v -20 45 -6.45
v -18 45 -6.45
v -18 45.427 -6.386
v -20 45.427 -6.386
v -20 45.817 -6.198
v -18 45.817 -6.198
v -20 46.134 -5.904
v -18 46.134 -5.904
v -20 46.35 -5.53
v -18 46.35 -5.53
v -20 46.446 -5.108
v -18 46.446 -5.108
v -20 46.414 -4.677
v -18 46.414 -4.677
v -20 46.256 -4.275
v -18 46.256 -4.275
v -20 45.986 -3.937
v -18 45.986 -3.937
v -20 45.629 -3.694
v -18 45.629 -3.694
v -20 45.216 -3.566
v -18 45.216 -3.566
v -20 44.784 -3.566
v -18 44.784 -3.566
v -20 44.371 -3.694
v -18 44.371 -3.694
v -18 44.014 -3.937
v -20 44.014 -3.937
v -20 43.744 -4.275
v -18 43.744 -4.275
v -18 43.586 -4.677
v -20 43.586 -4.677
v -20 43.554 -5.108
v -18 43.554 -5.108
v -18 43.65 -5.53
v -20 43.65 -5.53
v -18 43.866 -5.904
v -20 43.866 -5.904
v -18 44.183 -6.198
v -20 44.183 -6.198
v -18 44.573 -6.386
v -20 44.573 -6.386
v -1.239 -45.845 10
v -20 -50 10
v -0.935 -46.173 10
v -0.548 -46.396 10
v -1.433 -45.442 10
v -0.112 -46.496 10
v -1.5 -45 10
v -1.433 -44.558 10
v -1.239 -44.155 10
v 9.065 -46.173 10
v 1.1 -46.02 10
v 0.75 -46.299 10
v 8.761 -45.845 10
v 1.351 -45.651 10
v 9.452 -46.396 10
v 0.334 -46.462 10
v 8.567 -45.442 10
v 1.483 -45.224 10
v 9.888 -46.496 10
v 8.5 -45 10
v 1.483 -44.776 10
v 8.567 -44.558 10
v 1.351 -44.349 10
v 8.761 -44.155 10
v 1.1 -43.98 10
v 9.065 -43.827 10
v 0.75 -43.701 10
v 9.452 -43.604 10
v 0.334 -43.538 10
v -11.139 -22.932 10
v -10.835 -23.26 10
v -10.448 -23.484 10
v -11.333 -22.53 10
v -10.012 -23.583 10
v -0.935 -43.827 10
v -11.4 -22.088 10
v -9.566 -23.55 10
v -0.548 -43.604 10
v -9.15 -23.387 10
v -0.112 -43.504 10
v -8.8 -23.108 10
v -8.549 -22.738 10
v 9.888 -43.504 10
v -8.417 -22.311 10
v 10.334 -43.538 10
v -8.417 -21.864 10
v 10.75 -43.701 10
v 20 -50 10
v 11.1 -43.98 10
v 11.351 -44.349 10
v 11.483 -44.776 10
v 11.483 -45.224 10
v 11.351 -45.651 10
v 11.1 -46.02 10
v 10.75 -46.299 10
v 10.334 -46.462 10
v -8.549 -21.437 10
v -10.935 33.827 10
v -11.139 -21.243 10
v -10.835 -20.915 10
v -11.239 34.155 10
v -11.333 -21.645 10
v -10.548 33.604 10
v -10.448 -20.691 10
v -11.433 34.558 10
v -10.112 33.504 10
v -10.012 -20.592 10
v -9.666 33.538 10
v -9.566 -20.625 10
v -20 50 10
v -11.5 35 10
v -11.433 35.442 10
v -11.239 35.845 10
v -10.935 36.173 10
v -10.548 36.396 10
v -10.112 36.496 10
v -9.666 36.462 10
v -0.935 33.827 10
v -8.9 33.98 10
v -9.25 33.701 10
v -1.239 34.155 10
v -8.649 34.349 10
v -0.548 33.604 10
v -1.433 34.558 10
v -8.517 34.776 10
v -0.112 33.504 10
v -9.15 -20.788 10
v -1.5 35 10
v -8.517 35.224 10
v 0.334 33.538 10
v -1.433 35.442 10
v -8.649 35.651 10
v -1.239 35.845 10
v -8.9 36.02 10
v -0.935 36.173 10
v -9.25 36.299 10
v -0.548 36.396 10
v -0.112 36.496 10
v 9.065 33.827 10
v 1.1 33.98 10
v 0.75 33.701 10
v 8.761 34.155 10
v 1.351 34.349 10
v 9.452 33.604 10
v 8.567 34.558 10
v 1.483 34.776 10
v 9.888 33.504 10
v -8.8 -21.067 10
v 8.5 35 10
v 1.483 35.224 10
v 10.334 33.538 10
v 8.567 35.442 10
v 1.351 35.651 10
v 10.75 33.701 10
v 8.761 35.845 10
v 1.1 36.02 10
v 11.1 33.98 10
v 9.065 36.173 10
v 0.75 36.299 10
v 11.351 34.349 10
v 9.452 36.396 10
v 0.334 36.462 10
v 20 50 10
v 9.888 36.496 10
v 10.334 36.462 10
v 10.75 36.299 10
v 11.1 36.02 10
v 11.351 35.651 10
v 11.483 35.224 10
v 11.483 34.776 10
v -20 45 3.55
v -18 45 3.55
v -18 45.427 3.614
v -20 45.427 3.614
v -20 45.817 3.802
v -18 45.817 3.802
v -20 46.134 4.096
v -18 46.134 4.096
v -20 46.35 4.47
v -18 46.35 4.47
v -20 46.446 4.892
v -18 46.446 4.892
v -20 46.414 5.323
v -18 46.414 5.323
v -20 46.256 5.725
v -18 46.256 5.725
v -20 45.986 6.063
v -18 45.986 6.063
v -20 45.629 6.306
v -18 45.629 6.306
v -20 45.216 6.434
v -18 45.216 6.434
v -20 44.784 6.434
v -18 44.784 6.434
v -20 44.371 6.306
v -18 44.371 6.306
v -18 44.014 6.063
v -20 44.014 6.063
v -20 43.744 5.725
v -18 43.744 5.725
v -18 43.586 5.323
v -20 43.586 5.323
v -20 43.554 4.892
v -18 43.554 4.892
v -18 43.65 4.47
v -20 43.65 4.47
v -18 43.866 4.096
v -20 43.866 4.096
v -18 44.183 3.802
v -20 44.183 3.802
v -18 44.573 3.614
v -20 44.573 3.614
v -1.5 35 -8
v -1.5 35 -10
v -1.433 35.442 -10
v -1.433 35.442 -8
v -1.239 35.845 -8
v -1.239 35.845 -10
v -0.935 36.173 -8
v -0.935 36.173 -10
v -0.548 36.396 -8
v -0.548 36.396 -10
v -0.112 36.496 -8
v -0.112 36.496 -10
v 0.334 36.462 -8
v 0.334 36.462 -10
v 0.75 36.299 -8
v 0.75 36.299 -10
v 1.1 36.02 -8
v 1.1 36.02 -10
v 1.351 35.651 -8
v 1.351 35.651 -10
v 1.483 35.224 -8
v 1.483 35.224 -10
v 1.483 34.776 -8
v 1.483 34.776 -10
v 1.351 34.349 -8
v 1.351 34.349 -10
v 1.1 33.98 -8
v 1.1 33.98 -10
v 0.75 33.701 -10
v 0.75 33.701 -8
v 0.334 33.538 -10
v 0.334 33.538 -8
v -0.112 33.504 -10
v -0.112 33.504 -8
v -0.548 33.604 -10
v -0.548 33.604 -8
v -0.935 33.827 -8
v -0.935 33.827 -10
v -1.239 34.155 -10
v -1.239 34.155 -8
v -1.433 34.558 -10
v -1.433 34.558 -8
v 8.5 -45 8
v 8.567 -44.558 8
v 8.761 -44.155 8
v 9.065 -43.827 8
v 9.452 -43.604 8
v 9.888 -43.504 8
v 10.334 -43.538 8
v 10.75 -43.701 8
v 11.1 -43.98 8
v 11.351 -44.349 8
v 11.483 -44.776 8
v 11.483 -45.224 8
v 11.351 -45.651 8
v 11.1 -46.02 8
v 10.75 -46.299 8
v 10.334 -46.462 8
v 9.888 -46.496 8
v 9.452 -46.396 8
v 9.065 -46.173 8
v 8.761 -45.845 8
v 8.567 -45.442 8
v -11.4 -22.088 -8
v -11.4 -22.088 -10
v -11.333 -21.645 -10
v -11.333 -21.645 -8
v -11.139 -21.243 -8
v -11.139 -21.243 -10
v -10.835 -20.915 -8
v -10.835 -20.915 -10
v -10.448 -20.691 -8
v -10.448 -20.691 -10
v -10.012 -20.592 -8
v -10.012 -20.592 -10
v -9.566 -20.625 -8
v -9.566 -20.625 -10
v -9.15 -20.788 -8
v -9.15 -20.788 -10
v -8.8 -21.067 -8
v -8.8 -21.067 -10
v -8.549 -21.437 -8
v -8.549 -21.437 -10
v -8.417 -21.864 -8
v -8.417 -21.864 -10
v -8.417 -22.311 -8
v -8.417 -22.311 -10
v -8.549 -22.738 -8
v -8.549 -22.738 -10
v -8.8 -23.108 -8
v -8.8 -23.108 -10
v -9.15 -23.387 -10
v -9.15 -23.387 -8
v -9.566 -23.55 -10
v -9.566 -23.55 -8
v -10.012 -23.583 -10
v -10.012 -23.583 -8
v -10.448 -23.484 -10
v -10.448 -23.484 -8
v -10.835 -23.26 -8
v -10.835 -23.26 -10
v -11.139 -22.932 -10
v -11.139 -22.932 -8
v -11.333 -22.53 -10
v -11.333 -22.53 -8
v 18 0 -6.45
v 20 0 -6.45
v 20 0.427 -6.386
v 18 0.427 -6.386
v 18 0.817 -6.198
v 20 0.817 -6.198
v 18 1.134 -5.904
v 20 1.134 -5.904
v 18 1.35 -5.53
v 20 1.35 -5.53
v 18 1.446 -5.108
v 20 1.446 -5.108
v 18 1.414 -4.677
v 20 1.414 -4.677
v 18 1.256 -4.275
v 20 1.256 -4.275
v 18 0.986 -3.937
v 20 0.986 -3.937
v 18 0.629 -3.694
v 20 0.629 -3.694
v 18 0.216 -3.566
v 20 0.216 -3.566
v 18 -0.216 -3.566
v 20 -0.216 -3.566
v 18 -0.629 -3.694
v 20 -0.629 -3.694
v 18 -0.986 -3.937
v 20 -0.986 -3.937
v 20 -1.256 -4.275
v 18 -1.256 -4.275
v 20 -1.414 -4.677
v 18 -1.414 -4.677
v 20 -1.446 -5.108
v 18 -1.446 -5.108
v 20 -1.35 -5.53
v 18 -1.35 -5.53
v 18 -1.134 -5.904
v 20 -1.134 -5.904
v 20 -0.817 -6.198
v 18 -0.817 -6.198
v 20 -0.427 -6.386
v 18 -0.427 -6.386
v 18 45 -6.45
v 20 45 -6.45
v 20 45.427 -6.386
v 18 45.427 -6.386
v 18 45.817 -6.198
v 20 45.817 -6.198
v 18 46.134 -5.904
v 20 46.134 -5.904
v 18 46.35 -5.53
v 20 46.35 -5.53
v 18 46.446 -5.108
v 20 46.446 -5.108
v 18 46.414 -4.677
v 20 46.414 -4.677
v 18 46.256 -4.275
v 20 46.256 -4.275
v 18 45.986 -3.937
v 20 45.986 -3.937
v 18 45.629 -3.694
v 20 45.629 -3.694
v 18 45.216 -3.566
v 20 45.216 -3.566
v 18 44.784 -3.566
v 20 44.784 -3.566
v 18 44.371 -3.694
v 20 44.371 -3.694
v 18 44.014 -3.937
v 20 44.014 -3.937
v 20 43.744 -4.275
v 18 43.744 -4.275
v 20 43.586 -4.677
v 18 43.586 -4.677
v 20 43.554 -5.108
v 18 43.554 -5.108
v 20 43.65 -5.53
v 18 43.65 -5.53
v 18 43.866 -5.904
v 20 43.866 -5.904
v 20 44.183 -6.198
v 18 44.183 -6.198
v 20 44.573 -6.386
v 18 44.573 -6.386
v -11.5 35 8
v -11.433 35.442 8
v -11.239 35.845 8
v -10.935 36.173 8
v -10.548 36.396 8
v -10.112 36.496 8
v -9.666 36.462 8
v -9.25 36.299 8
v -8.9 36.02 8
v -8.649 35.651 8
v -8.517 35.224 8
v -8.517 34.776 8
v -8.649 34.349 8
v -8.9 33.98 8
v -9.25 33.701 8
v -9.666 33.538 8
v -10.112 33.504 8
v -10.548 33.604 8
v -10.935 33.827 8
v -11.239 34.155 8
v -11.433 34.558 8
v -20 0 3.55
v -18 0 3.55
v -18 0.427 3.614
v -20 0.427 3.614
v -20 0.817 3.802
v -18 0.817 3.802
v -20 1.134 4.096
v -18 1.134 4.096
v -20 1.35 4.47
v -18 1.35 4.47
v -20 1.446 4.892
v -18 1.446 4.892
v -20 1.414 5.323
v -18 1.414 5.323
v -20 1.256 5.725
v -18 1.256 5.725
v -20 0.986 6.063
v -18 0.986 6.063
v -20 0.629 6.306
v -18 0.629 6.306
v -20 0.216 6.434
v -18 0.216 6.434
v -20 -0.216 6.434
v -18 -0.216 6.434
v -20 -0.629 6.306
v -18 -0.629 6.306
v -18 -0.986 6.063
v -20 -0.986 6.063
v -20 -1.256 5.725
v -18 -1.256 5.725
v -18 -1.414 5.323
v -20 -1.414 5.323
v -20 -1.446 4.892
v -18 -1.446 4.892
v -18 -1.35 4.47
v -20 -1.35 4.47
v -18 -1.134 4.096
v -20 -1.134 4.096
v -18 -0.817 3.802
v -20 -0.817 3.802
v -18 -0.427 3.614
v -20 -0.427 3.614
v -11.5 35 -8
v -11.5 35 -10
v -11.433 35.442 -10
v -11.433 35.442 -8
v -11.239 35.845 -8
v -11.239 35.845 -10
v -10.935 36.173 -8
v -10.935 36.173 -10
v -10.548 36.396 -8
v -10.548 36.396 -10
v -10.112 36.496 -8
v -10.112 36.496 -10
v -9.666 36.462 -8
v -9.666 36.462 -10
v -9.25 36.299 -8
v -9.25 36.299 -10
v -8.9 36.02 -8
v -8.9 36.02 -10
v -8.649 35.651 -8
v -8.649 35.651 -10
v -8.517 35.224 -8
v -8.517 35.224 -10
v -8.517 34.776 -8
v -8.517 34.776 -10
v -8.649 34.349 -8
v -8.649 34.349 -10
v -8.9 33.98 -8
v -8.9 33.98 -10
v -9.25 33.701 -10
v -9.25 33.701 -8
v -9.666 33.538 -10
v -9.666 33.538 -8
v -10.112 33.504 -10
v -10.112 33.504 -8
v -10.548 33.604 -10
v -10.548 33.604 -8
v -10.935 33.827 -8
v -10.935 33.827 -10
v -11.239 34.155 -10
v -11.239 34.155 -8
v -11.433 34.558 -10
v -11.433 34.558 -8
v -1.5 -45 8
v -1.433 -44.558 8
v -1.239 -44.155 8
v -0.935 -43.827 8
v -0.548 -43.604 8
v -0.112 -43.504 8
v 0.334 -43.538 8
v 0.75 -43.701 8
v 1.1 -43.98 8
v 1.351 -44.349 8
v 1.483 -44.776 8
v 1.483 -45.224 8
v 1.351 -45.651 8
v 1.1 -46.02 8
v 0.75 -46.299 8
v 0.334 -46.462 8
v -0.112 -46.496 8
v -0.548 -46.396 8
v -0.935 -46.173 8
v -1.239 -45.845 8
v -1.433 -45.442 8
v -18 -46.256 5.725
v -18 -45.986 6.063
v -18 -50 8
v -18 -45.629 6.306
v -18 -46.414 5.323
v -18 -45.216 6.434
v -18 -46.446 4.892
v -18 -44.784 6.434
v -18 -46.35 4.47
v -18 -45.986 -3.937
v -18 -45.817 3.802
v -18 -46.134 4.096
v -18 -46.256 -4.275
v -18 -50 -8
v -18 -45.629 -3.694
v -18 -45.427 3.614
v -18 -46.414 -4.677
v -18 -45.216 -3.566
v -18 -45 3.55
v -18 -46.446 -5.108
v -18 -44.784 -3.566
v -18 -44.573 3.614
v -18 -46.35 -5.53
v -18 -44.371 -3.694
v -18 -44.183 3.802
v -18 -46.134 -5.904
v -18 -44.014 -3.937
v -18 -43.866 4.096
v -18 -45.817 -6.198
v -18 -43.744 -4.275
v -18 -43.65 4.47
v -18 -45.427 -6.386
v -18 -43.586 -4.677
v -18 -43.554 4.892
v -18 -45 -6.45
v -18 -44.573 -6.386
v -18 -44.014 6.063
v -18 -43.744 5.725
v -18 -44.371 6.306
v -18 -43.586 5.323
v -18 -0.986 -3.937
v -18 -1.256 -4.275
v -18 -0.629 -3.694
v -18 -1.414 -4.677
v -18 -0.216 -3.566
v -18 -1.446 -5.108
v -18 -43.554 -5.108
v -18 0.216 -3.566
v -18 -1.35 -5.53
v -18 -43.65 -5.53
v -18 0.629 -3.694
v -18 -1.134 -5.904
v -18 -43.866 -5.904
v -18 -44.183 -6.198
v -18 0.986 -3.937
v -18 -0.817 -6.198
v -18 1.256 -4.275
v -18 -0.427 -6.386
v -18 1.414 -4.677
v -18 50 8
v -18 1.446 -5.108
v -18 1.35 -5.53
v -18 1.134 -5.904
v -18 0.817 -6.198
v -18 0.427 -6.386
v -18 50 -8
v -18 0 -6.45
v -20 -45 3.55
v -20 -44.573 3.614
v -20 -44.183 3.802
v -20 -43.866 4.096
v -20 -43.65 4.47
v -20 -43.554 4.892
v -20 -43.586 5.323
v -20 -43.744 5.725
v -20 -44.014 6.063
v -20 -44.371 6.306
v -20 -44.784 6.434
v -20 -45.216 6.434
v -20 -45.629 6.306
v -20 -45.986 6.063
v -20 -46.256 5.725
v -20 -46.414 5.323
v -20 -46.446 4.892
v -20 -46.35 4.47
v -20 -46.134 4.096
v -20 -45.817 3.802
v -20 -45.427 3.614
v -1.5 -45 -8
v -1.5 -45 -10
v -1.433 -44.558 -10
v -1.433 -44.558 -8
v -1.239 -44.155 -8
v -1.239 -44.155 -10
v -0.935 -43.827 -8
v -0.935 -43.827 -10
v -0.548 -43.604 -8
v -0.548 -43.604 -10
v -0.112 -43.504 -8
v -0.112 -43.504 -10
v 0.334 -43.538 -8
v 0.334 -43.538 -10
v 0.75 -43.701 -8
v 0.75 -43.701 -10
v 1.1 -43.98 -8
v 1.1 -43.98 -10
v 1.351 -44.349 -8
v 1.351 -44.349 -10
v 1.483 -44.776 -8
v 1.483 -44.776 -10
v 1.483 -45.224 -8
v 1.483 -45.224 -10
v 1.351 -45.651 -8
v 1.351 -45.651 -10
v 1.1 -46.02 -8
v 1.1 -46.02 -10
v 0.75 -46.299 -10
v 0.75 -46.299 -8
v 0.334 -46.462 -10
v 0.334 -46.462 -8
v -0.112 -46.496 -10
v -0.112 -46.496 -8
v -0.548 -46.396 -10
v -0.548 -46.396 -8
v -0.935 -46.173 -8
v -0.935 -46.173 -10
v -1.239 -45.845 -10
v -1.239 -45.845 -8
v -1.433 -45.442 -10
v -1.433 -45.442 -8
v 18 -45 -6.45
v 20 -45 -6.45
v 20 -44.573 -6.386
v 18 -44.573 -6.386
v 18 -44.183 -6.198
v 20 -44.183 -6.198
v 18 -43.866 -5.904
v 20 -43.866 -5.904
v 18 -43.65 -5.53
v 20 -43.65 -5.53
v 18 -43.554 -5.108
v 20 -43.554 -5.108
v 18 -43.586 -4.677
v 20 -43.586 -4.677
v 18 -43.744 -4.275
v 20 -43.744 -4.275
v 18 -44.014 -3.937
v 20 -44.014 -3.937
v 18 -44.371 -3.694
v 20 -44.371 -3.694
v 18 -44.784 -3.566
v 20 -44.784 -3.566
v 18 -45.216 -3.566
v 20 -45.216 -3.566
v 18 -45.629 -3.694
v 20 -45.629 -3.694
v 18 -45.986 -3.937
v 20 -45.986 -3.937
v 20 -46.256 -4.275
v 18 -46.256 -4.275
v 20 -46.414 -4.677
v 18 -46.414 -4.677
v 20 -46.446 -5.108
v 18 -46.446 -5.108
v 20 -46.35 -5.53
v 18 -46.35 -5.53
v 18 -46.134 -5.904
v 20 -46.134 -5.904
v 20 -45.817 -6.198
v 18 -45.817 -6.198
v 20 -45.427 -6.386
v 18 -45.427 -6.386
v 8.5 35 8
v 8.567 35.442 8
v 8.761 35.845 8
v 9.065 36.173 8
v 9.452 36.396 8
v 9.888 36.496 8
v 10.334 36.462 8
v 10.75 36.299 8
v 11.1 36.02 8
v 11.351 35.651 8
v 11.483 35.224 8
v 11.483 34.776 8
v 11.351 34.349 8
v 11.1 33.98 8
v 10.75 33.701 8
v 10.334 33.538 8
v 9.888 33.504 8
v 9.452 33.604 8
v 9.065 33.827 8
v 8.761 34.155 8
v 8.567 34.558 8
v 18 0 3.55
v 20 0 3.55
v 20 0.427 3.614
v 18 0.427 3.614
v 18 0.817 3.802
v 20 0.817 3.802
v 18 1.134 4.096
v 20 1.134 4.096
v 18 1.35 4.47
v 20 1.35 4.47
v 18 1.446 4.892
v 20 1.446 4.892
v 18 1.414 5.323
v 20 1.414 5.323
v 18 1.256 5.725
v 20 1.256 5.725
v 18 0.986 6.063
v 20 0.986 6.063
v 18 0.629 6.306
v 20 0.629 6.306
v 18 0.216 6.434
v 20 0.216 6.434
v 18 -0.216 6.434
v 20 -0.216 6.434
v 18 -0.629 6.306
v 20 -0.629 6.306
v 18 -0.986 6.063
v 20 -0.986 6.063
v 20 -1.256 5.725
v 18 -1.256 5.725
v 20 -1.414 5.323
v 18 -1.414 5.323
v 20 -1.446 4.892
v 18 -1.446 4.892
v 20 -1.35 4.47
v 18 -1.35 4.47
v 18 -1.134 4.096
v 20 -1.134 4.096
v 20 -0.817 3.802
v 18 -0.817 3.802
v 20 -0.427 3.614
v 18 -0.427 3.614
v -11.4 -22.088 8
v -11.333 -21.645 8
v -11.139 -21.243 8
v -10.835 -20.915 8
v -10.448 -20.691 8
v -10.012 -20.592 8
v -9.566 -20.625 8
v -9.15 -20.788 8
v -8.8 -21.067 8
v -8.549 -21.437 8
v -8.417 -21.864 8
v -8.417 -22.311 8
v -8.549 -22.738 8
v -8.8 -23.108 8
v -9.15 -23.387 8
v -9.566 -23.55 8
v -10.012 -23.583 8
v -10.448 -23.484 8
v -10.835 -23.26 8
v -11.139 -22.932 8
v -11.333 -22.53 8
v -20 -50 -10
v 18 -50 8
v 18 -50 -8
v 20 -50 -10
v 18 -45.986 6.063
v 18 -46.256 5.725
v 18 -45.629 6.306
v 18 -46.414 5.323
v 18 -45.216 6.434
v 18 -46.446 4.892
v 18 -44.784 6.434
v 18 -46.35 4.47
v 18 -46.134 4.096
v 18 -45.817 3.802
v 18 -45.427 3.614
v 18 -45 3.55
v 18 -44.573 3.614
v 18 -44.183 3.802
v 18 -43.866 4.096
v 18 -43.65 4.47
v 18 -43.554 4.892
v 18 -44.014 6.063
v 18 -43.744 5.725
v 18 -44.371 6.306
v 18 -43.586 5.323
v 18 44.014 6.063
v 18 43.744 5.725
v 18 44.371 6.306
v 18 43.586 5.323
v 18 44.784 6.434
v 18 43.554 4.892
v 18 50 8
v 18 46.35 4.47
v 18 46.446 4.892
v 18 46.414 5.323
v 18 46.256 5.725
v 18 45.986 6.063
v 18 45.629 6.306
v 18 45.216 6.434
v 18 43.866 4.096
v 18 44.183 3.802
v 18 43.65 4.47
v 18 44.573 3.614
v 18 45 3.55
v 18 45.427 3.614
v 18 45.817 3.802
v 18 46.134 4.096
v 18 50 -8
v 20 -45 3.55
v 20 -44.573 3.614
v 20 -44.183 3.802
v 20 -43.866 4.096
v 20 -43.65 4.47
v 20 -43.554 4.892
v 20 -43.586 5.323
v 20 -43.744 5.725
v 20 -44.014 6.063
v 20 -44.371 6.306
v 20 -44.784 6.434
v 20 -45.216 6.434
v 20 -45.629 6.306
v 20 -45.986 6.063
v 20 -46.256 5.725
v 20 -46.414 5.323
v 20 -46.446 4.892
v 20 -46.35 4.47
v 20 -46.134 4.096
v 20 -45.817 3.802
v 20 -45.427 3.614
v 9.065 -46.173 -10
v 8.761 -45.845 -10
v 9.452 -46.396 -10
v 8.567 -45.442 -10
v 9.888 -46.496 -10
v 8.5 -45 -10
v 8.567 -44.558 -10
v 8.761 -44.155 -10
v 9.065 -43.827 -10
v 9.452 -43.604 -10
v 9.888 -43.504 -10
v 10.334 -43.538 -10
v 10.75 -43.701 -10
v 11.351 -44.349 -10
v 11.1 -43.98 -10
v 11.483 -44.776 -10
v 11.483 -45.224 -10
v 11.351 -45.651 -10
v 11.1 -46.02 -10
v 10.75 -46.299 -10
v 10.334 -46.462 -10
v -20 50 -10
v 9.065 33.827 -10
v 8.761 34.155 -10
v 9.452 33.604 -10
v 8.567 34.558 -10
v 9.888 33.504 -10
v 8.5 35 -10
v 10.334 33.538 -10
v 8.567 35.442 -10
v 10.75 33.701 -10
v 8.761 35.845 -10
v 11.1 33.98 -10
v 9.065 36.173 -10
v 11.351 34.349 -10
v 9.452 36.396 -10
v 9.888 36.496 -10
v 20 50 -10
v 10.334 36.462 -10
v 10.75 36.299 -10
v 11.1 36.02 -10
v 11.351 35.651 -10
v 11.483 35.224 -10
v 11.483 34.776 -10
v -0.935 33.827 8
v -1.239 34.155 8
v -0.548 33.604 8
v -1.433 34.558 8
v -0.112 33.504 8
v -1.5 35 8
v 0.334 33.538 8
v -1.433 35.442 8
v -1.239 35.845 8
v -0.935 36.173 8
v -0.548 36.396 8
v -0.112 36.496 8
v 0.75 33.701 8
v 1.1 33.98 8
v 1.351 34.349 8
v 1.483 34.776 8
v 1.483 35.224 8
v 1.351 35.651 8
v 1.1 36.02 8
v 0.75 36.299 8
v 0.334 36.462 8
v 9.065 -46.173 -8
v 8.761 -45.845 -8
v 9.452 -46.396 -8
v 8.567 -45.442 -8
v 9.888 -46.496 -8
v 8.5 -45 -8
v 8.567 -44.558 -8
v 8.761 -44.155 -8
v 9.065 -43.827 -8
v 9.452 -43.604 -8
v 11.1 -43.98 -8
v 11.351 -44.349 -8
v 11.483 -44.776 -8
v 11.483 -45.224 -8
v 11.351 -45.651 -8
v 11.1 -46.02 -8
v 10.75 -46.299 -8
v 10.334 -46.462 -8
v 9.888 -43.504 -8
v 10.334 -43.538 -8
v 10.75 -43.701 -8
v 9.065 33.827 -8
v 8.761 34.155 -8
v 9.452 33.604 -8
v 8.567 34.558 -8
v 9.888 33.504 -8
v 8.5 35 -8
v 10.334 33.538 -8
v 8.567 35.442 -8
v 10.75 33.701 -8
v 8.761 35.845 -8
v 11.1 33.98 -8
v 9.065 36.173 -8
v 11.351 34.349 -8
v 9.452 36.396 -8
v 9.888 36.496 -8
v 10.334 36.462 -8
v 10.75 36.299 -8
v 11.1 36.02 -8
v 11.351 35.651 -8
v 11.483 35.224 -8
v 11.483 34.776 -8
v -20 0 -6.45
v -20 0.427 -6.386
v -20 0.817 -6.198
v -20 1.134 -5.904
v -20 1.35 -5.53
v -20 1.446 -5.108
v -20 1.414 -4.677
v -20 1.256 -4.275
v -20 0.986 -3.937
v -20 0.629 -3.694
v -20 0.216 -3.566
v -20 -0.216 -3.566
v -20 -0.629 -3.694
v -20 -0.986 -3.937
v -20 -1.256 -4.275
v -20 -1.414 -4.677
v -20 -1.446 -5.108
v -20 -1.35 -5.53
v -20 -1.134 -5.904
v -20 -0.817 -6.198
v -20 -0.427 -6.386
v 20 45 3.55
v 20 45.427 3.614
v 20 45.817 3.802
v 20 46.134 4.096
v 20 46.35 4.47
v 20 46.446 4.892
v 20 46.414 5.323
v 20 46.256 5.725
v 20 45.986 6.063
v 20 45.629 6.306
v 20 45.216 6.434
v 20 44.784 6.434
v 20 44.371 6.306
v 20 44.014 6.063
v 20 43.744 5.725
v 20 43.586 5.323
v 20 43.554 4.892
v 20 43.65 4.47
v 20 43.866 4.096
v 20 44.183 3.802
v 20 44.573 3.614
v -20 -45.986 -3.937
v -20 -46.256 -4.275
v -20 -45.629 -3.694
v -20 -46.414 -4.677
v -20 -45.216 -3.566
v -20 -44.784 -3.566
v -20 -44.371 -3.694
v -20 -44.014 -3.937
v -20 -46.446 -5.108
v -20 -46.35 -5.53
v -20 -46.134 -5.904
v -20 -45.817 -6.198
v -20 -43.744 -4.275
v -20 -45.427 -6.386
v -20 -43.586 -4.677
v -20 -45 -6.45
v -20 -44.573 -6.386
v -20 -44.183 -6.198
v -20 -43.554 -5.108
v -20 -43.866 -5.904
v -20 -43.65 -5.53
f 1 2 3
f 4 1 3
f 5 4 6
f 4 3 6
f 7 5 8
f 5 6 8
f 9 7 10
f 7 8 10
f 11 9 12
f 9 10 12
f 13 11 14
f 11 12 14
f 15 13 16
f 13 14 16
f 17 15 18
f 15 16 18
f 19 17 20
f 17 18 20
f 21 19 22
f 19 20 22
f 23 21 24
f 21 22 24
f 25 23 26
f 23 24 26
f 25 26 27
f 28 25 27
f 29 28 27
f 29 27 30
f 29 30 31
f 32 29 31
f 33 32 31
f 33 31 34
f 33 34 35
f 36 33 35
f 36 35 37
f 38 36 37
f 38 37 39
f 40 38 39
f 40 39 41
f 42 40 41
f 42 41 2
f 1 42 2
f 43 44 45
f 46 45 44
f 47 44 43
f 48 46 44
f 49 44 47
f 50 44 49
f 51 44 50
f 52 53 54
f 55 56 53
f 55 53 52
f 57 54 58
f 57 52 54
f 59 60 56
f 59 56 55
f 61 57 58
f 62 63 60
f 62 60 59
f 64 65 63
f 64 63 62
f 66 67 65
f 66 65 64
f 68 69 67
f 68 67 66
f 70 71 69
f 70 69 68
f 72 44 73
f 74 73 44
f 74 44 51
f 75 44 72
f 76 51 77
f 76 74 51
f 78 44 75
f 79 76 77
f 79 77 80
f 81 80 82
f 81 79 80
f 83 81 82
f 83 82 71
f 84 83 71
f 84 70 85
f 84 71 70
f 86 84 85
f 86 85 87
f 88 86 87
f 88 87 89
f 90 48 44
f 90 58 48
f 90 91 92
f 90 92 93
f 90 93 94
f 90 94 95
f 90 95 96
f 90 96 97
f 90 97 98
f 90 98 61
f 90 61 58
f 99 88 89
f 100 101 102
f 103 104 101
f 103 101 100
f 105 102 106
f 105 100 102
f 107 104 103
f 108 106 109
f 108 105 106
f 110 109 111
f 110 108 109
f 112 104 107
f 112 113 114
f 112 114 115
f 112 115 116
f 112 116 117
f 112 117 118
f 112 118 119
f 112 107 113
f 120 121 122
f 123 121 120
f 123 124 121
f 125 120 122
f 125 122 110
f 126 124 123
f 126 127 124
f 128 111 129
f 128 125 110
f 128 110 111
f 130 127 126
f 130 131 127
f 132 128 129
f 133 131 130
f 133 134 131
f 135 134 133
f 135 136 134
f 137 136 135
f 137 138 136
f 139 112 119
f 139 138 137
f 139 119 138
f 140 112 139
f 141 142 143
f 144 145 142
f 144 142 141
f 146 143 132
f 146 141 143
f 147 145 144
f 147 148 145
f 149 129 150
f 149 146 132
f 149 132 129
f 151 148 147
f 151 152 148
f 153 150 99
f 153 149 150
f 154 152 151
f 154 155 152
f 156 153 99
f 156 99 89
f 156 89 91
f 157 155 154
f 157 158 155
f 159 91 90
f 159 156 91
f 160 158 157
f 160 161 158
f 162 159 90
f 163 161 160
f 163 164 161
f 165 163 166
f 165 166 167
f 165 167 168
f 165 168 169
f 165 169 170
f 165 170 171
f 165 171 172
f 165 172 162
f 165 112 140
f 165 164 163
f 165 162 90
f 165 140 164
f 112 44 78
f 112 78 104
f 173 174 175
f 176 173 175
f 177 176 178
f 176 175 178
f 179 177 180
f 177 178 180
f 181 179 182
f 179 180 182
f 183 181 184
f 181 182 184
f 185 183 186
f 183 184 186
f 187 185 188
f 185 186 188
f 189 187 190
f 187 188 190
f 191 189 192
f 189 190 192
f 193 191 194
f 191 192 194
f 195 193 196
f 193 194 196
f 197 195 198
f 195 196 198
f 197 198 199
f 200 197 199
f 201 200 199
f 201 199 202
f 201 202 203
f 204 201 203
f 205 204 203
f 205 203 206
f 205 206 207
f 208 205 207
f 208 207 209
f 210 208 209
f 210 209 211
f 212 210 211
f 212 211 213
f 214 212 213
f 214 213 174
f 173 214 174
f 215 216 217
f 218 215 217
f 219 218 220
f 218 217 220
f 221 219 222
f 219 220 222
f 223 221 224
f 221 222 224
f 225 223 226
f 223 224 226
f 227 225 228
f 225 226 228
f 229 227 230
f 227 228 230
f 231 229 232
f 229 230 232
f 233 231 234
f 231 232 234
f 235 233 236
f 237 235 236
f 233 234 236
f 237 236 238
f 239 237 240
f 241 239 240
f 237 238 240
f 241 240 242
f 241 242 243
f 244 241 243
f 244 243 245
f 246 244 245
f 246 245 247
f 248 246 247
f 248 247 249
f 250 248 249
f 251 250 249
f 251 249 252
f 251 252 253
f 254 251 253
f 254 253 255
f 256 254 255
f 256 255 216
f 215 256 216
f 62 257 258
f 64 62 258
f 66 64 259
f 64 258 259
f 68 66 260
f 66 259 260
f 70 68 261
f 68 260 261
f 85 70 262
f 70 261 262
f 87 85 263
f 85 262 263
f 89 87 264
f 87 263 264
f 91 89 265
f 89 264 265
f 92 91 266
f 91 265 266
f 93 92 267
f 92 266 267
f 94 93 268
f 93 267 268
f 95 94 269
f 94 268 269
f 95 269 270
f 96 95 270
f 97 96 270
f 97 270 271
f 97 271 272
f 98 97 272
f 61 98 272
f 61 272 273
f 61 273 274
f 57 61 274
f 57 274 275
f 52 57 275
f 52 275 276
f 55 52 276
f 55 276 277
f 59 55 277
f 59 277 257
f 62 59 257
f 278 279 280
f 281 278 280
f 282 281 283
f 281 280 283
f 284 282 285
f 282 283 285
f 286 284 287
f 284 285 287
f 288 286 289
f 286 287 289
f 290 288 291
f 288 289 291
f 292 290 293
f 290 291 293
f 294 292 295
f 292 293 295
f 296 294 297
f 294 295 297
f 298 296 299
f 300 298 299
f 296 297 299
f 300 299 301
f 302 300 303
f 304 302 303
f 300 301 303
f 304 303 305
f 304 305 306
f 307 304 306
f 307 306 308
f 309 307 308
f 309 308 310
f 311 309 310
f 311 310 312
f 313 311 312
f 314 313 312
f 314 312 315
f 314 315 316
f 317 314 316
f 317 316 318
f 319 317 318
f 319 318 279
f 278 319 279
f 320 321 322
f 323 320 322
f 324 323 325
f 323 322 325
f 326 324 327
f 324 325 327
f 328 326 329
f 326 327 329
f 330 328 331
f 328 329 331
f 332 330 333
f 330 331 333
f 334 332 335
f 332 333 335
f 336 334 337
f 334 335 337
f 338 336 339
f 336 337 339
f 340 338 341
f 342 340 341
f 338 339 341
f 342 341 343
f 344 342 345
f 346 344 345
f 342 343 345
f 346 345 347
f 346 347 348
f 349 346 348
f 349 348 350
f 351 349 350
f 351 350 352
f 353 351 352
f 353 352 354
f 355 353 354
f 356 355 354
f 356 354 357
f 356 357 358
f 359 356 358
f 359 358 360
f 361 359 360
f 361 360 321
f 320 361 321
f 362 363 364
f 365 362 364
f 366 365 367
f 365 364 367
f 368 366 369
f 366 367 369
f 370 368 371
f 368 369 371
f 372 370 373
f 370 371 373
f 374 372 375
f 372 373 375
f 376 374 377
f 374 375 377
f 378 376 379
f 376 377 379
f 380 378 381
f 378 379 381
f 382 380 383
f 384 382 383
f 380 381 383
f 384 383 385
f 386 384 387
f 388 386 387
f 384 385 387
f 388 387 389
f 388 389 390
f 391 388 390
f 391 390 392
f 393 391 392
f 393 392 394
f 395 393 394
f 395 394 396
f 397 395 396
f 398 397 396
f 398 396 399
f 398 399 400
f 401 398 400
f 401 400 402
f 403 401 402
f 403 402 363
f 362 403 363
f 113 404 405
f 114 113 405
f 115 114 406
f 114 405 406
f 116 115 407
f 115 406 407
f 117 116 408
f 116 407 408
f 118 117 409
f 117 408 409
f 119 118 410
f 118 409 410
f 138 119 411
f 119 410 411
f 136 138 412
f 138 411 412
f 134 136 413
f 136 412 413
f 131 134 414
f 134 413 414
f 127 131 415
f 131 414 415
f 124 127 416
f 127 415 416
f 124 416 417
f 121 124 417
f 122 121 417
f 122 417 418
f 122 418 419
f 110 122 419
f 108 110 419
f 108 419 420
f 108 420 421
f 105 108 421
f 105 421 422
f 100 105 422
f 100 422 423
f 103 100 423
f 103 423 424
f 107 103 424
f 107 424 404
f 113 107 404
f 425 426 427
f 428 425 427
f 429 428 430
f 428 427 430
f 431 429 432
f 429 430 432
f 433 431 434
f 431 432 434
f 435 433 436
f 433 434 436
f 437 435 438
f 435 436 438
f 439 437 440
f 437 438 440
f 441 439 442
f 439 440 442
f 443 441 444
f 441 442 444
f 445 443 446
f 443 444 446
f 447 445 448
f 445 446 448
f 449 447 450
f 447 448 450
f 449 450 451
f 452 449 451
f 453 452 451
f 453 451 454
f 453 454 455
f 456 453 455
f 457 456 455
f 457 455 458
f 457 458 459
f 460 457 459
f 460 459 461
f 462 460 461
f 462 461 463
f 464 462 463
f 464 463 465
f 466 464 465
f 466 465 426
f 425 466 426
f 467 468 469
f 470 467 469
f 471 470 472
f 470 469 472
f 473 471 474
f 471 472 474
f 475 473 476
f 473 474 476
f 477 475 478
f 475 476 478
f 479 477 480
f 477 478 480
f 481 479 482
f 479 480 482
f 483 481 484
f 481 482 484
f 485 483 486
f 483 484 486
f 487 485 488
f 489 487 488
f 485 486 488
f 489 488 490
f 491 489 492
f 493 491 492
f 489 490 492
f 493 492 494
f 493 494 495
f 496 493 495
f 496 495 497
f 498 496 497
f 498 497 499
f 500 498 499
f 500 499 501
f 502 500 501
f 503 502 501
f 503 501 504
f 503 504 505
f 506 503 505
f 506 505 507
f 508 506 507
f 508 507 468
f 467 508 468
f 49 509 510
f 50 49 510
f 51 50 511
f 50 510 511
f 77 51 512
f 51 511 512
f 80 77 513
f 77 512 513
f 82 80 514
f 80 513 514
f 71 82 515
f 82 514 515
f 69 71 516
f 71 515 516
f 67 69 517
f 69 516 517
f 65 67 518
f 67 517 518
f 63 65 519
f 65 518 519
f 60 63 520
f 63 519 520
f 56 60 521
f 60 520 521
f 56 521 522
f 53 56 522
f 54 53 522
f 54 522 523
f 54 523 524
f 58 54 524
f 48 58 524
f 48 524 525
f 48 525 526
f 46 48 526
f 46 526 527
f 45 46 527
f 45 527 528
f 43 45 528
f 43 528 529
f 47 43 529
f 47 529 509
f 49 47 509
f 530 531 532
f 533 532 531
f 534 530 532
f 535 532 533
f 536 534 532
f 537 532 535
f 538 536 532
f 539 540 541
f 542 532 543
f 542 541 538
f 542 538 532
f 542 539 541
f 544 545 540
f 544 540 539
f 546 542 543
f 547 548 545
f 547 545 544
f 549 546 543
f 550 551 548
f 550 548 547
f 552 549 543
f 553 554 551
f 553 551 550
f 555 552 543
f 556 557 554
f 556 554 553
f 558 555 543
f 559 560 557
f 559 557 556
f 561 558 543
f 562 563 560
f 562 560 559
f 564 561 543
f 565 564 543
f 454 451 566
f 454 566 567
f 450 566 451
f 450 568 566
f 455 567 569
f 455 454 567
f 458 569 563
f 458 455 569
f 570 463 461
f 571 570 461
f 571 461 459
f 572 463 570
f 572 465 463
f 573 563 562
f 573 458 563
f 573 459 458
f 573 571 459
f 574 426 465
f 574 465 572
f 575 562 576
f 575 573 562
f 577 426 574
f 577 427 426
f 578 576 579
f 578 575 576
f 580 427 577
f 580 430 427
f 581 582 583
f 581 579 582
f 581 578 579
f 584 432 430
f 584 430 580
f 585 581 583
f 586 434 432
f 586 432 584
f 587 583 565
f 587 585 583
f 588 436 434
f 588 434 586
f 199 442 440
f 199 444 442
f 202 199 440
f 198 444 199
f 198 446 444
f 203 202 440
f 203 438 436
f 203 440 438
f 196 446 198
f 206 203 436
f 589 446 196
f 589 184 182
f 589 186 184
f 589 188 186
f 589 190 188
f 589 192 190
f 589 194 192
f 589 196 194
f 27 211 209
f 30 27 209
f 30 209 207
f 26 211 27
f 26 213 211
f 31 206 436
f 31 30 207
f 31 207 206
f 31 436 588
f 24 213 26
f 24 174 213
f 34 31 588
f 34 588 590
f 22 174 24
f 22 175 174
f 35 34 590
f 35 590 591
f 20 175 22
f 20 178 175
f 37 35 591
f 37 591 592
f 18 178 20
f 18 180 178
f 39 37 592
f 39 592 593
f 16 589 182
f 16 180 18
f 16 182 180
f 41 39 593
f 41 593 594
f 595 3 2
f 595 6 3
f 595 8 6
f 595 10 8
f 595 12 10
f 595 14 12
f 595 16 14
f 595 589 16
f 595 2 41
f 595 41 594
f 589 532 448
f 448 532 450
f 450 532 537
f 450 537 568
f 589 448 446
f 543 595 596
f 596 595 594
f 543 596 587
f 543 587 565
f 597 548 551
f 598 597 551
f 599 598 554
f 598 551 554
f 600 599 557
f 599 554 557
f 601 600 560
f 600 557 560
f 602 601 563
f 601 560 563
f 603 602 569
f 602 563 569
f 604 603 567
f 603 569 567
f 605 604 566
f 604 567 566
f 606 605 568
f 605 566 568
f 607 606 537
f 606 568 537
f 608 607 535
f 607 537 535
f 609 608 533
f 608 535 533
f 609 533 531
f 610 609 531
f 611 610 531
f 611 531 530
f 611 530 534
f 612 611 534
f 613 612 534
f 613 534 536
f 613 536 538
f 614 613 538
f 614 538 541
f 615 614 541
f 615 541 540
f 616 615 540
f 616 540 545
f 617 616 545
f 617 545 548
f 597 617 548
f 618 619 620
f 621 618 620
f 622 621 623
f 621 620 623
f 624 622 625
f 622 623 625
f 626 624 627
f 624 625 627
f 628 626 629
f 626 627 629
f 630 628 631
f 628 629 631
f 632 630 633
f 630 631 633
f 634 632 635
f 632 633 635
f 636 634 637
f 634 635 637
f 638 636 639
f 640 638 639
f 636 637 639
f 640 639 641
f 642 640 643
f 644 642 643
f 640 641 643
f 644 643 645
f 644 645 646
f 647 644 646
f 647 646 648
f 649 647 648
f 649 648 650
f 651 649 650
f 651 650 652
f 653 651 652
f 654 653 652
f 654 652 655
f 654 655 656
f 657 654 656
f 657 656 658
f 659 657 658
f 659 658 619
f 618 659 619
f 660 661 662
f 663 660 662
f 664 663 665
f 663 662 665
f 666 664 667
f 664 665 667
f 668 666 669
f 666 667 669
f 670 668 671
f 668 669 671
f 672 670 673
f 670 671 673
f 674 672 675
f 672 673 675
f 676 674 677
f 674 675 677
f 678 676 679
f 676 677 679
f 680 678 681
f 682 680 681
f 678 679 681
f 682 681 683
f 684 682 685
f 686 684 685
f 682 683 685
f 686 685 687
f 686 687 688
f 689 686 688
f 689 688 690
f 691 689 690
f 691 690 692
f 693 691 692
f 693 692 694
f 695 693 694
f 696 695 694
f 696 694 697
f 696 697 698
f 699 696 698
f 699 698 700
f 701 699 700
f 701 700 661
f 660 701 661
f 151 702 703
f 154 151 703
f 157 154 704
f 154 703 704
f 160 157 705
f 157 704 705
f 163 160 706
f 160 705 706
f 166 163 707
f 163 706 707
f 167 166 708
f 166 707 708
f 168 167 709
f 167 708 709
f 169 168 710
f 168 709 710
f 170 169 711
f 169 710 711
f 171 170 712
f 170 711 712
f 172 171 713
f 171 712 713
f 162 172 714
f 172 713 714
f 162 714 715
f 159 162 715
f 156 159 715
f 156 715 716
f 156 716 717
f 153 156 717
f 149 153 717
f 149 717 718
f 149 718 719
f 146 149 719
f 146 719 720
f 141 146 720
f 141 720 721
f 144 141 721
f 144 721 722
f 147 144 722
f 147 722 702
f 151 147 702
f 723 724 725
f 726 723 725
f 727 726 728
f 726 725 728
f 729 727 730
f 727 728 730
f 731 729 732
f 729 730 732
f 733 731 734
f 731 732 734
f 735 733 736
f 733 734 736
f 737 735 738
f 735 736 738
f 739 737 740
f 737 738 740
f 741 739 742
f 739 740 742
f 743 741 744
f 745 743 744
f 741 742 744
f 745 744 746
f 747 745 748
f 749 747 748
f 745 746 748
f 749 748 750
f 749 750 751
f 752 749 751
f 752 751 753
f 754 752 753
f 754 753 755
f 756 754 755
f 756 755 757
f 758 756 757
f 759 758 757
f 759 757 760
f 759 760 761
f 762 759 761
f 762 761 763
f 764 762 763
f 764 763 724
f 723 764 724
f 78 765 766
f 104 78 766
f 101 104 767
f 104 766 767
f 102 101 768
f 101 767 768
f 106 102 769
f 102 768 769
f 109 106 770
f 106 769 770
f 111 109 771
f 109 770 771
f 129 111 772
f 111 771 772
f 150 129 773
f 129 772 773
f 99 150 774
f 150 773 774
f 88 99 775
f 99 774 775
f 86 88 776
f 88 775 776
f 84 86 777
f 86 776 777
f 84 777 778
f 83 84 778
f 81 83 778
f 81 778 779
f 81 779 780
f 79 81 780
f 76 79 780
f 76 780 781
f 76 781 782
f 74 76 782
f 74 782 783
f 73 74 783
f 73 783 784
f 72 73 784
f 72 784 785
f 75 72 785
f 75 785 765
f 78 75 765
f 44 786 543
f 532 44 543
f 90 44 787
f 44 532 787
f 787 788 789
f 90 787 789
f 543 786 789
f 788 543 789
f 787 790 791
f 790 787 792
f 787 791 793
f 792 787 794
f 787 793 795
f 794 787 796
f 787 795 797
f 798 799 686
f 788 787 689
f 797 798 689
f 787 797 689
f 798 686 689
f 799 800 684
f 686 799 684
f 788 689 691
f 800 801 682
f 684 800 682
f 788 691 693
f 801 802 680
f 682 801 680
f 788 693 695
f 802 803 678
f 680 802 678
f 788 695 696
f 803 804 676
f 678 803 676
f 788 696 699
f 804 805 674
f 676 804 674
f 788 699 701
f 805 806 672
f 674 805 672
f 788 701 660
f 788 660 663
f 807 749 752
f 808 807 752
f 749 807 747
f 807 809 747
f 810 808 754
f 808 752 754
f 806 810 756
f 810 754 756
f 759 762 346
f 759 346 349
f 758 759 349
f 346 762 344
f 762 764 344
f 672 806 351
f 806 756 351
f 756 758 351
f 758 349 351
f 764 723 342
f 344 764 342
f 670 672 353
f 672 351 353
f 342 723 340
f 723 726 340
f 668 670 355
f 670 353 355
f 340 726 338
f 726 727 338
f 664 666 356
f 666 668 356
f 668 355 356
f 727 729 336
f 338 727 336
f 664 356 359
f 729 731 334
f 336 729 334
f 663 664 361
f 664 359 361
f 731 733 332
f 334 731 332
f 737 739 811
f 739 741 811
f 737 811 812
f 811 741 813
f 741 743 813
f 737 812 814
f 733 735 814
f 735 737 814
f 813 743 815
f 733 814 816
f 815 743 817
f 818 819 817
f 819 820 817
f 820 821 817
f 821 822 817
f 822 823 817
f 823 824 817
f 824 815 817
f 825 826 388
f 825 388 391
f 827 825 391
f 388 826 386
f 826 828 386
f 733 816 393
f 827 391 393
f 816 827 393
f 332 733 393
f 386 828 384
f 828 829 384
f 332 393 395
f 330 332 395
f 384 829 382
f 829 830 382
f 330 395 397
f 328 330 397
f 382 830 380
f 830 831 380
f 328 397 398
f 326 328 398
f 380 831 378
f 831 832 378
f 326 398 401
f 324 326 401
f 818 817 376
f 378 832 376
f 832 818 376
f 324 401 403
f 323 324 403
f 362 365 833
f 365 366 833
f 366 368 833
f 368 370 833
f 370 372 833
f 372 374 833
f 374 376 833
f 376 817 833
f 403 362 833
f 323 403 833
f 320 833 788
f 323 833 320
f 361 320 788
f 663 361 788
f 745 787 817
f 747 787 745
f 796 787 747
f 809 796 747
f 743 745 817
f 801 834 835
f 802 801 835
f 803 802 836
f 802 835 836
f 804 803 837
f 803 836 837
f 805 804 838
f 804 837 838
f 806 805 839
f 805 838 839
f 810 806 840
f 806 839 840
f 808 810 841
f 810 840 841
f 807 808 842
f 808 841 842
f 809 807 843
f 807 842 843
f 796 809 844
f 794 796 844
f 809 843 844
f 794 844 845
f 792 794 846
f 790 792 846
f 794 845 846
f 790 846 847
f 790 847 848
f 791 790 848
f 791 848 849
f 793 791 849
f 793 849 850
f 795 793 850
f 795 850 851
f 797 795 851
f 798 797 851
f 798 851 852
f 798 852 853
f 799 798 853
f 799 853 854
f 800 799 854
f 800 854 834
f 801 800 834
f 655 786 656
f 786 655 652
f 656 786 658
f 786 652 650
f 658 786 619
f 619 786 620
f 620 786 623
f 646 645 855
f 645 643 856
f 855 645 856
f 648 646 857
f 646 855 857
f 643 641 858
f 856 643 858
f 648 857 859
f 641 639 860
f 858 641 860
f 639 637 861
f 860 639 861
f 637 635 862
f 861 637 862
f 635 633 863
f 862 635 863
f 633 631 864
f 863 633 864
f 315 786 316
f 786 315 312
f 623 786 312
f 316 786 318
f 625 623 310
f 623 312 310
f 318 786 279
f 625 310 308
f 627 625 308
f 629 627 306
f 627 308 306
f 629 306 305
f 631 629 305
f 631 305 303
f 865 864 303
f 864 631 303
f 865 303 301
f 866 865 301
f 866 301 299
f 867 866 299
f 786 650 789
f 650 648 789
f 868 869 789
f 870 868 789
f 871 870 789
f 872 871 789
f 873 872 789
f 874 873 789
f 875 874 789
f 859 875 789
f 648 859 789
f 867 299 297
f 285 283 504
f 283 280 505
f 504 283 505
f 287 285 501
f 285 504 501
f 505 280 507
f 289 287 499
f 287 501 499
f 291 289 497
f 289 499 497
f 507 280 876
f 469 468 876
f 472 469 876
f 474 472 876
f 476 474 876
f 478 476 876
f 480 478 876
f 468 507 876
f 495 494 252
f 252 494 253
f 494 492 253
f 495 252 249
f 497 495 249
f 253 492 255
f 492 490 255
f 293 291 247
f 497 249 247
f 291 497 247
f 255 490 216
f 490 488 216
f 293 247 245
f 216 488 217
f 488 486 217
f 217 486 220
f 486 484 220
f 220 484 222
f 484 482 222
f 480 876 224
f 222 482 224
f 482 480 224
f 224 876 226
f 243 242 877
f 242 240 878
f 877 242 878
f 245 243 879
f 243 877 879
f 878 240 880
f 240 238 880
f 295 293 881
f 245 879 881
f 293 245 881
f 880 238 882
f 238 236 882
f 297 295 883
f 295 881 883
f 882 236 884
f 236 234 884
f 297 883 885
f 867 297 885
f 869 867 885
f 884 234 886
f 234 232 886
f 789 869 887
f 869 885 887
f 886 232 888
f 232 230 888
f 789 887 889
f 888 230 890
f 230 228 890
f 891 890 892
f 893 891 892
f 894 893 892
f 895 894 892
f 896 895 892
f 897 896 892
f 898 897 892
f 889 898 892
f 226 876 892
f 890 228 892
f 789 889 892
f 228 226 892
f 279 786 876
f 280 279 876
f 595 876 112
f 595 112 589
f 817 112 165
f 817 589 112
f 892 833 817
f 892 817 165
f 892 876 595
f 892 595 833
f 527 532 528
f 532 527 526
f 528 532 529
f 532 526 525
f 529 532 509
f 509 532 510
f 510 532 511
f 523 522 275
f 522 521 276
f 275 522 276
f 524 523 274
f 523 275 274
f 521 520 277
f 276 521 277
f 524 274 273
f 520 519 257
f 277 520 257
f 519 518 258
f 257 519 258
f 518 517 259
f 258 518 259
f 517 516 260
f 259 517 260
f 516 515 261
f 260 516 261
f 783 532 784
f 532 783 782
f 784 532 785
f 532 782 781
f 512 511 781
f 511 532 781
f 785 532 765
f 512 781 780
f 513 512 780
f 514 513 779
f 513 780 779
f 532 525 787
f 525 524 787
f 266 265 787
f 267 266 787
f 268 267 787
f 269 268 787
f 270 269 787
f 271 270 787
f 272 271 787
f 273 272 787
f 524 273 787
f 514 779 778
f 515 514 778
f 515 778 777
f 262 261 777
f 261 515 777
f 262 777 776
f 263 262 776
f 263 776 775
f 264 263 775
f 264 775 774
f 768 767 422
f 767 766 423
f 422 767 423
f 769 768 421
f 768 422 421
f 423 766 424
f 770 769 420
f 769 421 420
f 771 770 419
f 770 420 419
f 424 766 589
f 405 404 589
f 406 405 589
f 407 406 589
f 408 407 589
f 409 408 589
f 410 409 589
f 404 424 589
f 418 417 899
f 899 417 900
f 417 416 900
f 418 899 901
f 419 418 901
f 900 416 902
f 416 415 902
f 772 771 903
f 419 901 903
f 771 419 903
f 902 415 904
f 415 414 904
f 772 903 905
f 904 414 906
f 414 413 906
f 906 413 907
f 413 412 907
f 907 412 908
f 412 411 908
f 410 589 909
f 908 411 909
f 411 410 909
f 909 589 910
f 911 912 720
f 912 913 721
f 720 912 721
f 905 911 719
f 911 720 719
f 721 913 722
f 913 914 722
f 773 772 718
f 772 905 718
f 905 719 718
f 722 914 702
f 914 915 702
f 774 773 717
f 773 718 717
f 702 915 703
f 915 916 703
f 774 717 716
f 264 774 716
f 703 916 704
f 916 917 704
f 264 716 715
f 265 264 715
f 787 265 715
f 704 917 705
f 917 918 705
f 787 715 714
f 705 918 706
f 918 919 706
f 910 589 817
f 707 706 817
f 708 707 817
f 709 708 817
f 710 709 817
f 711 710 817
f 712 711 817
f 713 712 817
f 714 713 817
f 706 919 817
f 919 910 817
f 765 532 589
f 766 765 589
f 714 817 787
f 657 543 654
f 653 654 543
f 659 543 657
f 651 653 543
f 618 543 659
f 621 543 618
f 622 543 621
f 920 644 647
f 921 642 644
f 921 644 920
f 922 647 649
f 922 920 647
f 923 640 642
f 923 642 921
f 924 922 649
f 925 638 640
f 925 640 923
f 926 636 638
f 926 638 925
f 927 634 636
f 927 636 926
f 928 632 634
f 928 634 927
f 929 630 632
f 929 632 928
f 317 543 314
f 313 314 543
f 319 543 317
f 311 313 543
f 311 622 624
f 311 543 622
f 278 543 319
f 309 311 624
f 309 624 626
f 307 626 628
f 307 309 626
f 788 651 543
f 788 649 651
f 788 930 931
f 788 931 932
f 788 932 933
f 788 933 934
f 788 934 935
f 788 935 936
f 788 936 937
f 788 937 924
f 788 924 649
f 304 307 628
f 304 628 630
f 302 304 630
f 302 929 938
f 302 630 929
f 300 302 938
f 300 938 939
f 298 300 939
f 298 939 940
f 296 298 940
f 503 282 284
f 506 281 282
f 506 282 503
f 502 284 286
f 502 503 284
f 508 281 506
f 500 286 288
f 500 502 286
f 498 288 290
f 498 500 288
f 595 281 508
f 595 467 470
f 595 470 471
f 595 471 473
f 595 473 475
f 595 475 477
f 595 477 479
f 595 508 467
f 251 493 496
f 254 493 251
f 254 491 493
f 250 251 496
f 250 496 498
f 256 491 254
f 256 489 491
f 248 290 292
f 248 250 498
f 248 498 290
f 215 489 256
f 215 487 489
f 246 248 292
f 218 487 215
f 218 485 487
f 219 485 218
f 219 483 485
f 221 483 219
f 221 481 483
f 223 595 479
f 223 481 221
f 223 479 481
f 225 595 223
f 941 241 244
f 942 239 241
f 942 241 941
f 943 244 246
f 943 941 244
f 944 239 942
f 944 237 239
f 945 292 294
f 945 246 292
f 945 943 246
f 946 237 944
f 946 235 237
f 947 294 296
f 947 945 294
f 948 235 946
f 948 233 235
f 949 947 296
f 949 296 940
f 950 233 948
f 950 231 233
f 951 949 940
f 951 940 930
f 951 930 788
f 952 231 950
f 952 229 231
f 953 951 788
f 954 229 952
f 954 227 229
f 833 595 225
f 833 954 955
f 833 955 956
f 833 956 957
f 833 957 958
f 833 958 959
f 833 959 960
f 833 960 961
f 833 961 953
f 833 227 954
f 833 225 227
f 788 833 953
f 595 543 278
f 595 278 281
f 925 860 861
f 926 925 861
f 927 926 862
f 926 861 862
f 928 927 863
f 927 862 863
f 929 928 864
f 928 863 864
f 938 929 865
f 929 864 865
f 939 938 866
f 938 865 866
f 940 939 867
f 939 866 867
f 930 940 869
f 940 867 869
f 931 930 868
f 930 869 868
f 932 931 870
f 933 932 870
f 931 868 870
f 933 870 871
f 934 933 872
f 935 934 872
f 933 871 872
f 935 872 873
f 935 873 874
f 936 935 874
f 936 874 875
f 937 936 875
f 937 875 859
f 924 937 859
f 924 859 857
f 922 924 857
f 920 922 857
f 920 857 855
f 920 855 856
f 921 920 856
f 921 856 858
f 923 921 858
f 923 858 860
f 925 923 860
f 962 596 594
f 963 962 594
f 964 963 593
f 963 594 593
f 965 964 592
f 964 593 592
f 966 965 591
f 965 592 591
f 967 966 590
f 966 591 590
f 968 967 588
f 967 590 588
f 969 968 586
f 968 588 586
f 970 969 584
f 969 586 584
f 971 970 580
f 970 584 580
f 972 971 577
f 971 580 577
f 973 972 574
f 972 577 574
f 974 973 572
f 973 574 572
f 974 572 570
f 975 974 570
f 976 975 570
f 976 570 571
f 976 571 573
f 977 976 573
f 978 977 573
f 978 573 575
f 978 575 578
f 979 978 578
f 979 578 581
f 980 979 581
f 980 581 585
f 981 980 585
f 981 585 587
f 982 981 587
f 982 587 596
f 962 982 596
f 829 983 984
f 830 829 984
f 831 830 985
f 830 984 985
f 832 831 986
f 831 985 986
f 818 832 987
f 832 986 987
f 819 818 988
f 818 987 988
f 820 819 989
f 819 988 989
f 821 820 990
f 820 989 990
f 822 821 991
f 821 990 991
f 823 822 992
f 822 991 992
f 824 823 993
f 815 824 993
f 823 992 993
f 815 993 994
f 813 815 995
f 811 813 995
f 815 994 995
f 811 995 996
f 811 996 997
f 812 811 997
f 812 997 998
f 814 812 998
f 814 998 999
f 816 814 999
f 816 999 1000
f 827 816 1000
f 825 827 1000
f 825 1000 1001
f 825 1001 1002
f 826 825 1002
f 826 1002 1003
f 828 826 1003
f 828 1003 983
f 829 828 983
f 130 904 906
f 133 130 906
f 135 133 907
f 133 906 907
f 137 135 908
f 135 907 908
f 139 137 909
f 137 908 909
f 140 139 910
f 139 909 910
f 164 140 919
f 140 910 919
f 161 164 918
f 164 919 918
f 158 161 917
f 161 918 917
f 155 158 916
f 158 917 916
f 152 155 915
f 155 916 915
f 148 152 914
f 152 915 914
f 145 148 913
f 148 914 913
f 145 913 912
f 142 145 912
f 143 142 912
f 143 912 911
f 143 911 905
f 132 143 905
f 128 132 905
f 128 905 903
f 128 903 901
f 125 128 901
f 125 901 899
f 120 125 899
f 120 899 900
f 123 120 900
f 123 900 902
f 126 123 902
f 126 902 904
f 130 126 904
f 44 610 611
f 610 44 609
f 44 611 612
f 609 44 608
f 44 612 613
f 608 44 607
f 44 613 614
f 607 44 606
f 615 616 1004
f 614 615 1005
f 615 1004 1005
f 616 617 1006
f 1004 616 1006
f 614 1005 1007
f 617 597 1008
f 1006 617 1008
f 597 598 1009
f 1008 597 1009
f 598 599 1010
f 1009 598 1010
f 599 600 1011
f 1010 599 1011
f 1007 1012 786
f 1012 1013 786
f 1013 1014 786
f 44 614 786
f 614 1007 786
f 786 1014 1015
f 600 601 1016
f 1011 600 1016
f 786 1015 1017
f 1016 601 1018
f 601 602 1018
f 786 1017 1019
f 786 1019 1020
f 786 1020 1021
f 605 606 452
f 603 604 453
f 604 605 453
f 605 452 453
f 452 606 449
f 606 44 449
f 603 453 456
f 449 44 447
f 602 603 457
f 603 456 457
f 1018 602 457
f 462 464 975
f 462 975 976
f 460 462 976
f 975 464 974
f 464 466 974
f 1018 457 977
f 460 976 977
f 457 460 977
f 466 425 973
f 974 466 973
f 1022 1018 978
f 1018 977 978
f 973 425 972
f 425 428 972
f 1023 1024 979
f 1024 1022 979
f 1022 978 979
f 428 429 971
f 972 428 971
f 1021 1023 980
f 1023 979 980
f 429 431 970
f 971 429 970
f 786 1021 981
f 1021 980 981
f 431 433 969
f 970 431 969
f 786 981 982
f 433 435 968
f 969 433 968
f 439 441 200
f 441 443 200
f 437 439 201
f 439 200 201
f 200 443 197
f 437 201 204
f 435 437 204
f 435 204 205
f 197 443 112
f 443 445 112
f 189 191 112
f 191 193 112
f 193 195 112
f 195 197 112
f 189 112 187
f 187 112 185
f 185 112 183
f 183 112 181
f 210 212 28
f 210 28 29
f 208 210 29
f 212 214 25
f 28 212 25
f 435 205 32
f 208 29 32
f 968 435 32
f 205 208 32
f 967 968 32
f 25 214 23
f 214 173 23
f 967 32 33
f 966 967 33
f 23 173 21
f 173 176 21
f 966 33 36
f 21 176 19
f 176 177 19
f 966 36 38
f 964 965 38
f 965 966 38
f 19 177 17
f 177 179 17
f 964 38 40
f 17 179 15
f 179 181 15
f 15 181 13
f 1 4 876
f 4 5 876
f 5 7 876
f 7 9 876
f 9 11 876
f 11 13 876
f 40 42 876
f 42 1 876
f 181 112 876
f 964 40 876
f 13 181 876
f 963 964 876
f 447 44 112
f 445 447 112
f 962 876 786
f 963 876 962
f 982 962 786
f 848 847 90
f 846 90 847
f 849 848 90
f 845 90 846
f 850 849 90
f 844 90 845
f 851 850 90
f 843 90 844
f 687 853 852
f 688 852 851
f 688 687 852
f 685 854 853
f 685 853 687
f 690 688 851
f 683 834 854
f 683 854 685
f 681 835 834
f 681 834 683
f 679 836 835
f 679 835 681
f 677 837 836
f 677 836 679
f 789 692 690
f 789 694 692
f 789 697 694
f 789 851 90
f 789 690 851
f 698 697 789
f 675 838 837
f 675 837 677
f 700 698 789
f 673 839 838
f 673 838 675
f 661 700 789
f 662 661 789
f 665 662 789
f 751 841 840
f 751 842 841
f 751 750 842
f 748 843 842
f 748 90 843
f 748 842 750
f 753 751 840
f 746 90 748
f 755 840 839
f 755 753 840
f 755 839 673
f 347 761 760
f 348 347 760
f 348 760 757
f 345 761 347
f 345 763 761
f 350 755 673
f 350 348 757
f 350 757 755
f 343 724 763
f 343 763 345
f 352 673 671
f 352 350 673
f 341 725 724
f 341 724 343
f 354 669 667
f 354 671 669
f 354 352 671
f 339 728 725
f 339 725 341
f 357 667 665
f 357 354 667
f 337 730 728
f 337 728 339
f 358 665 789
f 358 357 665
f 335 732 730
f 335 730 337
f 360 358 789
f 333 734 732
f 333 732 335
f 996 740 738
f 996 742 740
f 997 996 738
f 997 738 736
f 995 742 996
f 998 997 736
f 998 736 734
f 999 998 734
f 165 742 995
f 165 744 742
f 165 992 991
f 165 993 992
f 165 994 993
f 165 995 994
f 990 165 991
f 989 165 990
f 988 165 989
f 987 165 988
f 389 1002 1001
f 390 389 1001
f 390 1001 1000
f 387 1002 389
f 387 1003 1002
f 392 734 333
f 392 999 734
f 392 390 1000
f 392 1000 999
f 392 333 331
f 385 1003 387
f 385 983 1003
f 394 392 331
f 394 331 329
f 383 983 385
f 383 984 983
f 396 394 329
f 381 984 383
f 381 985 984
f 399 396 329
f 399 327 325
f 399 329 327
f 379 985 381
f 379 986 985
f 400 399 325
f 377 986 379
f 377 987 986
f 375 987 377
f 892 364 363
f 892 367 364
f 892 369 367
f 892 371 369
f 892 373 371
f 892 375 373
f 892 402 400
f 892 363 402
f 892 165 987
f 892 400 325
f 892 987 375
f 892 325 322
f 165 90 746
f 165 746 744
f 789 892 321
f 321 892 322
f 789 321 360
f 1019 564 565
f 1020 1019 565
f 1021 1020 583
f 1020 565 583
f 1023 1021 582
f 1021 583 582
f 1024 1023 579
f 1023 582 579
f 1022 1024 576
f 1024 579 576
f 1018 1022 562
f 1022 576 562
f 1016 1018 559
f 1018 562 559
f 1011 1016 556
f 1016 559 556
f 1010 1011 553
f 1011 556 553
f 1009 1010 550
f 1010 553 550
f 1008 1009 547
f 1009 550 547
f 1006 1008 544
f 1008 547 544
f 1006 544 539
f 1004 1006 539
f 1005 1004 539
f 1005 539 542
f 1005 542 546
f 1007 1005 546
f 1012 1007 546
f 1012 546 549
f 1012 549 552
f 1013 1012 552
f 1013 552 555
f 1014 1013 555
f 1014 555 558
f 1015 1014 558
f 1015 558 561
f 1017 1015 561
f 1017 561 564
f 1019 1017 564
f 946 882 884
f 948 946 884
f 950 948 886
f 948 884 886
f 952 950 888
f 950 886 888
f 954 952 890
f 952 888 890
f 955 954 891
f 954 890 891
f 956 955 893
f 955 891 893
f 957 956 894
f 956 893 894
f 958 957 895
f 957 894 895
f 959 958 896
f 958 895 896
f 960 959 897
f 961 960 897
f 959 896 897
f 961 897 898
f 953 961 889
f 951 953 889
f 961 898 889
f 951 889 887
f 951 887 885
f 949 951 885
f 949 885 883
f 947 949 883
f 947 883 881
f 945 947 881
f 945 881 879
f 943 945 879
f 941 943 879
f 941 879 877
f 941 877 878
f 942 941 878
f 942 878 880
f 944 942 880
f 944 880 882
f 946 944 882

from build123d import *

# Parameters (mm, degrees)
SKETCH_1_W          = 40
SKETCH_1_H          = 20
SKETCH_1_W_2        = 36
SKETCH_1_H_2        = 16
EXTRUDE_1_DEPTH     = 50
SKETCH_2_R          = 1.45
CUT_EXTRUDE_1_DEPTH = 65.807406984
SKETCH_3_R          = 1.5
CUT_EXTRUDE_2_DEPTH = 58.445626465
SKETCH_4_R          = 1.5
CUT_EXTRUDE_3_DEPTH = 58.445626465


with BuildPart() as part:
    # 草图1 → 凸台-拉伸1 (new, symmetric)
    with BuildSketch(Plane(origin=(0, 0, 0), x_dir=(1, 0, 0), z_dir=(0, 1, 0))):
        Rectangle(SKETCH_1_W, SKETCH_1_H)
        Rectangle(SKETCH_1_W_2, SKETCH_1_H_2, mode=Mode.SUBTRACT)
    extrude(amount=EXTRUDE_1_DEPTH, both=True)

    # 草图2 → 切除-拉伸1 (cut, through all)
    with BuildSketch(Plane(origin=(20, 0, 0), x_dir=(0, 0, -1), z_dir=(1, 0, 0))):
        with Locations((5, 45)):
            Circle(SKETCH_2_R)
        with Locations((-5, 45)):
            Circle(SKETCH_2_R)
        with Locations((5, 0)):
            Circle(SKETCH_2_R)
        with Locations((-5, 0)):
            Circle(SKETCH_2_R)
        with Locations((5, -45)):
            Circle(SKETCH_2_R)
        with Locations((-5, -45)):
            Circle(SKETCH_2_R)
    extrude(amount=-CUT_EXTRUDE_1_DEPTH, mode=Mode.SUBTRACT)

    # 草图3 → 切除-拉伸2 (cut, through all)
    with BuildSketch(Plane(origin=(0, 0, -10), x_dir=(-1, 0, 0), z_dir=(0, 0, -1))):
        with Locations((10, 35)):
            Circle(SKETCH_3_R)
        with Locations((0, 35)):
            Circle(SKETCH_3_R)
        with Locations((-10, 35)):
            Circle(SKETCH_3_R)
    extrude(amount=-CUT_EXTRUDE_2_DEPTH, mode=Mode.SUBTRACT)

    # 草图4 → 切除-拉伸3 (cut, through all)
    with BuildSketch(Plane(origin=(0, 0, -10), x_dir=(-1, 0, 0), z_dir=(0, 0, -1))):
        with Locations((0, -45)):
            Circle(SKETCH_4_R)
        with Locations((-10, -45)):
            Circle(SKETCH_4_R)
        with Locations((9.9, -22.0875)):
            Circle(SKETCH_4_R)
    extrude(amount=-CUT_EXTRUDE_3_DEPTH, mode=Mode.SUBTRACT)


solid = part.part
